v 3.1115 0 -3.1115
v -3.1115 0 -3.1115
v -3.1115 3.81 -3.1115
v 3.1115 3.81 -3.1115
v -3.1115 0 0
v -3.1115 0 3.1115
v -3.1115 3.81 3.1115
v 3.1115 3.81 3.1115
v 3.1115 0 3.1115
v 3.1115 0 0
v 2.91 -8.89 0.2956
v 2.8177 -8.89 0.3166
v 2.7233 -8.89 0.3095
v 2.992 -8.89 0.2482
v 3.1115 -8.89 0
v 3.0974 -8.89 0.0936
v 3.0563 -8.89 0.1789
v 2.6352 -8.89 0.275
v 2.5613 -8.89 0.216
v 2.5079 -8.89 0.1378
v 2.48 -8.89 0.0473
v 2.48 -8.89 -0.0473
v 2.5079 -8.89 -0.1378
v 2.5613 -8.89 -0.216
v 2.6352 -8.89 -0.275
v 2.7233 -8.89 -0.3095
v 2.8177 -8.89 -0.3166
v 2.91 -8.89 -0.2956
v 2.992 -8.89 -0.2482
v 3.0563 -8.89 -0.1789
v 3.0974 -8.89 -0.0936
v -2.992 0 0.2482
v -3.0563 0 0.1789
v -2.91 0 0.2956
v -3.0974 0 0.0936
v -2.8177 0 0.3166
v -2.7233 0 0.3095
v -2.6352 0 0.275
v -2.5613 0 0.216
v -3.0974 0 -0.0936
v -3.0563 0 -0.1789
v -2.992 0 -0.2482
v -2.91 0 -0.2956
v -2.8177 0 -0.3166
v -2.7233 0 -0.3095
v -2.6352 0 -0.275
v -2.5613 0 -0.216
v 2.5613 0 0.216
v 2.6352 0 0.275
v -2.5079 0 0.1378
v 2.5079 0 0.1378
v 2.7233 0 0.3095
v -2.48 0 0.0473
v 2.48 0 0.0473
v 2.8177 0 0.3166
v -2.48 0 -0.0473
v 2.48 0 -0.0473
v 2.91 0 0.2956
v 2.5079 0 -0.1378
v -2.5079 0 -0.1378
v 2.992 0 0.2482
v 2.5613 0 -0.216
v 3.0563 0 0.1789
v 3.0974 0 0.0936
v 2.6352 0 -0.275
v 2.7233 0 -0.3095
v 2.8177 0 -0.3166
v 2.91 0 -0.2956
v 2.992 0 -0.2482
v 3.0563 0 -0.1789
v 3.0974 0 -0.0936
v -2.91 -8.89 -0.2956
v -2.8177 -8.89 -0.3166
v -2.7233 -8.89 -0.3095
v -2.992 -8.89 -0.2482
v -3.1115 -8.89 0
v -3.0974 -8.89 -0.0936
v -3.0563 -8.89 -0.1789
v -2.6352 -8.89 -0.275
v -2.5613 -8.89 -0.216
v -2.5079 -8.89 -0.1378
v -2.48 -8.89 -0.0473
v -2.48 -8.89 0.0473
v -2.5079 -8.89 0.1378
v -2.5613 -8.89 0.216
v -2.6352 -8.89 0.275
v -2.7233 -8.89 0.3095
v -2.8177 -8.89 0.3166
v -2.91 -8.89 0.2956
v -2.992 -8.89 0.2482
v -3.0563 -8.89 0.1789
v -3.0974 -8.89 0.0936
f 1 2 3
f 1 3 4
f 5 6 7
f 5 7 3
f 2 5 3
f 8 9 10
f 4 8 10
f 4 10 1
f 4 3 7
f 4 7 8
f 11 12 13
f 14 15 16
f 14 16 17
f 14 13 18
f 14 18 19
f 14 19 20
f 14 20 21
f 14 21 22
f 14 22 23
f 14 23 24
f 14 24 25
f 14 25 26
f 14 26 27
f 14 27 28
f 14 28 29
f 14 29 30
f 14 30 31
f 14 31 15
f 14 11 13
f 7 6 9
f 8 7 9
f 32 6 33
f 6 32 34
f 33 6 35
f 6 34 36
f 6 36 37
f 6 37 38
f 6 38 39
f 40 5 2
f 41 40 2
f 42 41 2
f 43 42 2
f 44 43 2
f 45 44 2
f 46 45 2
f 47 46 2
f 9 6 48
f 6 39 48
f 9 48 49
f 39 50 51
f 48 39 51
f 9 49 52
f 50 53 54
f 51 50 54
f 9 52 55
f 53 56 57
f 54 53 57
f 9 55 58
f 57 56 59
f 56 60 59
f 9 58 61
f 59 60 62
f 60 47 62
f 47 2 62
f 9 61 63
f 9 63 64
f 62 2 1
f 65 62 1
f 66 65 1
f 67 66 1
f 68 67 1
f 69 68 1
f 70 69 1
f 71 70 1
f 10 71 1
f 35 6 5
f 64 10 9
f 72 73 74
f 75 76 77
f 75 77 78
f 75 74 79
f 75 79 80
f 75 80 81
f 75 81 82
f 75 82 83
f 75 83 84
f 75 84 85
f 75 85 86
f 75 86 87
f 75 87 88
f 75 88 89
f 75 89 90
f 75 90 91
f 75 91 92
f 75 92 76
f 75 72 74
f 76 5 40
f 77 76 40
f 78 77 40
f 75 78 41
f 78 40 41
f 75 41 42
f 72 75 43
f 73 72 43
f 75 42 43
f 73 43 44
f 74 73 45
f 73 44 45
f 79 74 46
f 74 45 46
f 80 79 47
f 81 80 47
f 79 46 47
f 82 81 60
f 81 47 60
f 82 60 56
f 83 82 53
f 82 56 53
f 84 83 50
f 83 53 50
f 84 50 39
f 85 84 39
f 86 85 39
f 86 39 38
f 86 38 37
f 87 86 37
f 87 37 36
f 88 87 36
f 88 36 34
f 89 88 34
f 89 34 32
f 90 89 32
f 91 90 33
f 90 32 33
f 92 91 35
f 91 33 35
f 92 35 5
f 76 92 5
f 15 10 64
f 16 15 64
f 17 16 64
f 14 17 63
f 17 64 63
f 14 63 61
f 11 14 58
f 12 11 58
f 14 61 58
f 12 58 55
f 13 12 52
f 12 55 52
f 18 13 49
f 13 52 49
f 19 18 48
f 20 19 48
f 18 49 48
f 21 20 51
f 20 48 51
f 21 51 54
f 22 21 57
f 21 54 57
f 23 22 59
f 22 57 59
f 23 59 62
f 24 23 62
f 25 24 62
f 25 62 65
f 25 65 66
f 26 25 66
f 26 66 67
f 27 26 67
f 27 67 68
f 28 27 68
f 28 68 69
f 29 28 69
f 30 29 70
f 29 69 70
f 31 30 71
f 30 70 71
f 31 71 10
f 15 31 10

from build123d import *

# Parameters (mm, degrees)
SKETCH1_W           = 6.223
SKETCH1_H           = 6.223
BOSS_EXTRUDE1_DEPTH = 3.81
SKETCH2_R           = 0.3175
BOSS_EXTRUDE2_DEPTH = 8.89


with BuildPart() as part:
    # Sketch1 → Boss-Extrude1 (new body)
    with BuildSketch(Plane(origin=(0, 0, 0), x_dir=(1, 0, 0), z_dir=(0, 1, 0))):
        Rectangle(SKETCH1_W, SKETCH1_H)
    extrude(amount=BOSS_EXTRUDE1_DEPTH)

    # Sketch2 → Boss-Extrude2 (add)
    with BuildSketch(Plane.XZ):
        with Locations(Location((-2.794, 0, 0), (0, 0, 180))):
            Circle(SKETCH2_R)
        with Locations((2.794, 0)):
            Circle(SKETCH2_R)
    extrude(amount=BOSS_EXTRUDE2_DEPTH)


solid = part.part
